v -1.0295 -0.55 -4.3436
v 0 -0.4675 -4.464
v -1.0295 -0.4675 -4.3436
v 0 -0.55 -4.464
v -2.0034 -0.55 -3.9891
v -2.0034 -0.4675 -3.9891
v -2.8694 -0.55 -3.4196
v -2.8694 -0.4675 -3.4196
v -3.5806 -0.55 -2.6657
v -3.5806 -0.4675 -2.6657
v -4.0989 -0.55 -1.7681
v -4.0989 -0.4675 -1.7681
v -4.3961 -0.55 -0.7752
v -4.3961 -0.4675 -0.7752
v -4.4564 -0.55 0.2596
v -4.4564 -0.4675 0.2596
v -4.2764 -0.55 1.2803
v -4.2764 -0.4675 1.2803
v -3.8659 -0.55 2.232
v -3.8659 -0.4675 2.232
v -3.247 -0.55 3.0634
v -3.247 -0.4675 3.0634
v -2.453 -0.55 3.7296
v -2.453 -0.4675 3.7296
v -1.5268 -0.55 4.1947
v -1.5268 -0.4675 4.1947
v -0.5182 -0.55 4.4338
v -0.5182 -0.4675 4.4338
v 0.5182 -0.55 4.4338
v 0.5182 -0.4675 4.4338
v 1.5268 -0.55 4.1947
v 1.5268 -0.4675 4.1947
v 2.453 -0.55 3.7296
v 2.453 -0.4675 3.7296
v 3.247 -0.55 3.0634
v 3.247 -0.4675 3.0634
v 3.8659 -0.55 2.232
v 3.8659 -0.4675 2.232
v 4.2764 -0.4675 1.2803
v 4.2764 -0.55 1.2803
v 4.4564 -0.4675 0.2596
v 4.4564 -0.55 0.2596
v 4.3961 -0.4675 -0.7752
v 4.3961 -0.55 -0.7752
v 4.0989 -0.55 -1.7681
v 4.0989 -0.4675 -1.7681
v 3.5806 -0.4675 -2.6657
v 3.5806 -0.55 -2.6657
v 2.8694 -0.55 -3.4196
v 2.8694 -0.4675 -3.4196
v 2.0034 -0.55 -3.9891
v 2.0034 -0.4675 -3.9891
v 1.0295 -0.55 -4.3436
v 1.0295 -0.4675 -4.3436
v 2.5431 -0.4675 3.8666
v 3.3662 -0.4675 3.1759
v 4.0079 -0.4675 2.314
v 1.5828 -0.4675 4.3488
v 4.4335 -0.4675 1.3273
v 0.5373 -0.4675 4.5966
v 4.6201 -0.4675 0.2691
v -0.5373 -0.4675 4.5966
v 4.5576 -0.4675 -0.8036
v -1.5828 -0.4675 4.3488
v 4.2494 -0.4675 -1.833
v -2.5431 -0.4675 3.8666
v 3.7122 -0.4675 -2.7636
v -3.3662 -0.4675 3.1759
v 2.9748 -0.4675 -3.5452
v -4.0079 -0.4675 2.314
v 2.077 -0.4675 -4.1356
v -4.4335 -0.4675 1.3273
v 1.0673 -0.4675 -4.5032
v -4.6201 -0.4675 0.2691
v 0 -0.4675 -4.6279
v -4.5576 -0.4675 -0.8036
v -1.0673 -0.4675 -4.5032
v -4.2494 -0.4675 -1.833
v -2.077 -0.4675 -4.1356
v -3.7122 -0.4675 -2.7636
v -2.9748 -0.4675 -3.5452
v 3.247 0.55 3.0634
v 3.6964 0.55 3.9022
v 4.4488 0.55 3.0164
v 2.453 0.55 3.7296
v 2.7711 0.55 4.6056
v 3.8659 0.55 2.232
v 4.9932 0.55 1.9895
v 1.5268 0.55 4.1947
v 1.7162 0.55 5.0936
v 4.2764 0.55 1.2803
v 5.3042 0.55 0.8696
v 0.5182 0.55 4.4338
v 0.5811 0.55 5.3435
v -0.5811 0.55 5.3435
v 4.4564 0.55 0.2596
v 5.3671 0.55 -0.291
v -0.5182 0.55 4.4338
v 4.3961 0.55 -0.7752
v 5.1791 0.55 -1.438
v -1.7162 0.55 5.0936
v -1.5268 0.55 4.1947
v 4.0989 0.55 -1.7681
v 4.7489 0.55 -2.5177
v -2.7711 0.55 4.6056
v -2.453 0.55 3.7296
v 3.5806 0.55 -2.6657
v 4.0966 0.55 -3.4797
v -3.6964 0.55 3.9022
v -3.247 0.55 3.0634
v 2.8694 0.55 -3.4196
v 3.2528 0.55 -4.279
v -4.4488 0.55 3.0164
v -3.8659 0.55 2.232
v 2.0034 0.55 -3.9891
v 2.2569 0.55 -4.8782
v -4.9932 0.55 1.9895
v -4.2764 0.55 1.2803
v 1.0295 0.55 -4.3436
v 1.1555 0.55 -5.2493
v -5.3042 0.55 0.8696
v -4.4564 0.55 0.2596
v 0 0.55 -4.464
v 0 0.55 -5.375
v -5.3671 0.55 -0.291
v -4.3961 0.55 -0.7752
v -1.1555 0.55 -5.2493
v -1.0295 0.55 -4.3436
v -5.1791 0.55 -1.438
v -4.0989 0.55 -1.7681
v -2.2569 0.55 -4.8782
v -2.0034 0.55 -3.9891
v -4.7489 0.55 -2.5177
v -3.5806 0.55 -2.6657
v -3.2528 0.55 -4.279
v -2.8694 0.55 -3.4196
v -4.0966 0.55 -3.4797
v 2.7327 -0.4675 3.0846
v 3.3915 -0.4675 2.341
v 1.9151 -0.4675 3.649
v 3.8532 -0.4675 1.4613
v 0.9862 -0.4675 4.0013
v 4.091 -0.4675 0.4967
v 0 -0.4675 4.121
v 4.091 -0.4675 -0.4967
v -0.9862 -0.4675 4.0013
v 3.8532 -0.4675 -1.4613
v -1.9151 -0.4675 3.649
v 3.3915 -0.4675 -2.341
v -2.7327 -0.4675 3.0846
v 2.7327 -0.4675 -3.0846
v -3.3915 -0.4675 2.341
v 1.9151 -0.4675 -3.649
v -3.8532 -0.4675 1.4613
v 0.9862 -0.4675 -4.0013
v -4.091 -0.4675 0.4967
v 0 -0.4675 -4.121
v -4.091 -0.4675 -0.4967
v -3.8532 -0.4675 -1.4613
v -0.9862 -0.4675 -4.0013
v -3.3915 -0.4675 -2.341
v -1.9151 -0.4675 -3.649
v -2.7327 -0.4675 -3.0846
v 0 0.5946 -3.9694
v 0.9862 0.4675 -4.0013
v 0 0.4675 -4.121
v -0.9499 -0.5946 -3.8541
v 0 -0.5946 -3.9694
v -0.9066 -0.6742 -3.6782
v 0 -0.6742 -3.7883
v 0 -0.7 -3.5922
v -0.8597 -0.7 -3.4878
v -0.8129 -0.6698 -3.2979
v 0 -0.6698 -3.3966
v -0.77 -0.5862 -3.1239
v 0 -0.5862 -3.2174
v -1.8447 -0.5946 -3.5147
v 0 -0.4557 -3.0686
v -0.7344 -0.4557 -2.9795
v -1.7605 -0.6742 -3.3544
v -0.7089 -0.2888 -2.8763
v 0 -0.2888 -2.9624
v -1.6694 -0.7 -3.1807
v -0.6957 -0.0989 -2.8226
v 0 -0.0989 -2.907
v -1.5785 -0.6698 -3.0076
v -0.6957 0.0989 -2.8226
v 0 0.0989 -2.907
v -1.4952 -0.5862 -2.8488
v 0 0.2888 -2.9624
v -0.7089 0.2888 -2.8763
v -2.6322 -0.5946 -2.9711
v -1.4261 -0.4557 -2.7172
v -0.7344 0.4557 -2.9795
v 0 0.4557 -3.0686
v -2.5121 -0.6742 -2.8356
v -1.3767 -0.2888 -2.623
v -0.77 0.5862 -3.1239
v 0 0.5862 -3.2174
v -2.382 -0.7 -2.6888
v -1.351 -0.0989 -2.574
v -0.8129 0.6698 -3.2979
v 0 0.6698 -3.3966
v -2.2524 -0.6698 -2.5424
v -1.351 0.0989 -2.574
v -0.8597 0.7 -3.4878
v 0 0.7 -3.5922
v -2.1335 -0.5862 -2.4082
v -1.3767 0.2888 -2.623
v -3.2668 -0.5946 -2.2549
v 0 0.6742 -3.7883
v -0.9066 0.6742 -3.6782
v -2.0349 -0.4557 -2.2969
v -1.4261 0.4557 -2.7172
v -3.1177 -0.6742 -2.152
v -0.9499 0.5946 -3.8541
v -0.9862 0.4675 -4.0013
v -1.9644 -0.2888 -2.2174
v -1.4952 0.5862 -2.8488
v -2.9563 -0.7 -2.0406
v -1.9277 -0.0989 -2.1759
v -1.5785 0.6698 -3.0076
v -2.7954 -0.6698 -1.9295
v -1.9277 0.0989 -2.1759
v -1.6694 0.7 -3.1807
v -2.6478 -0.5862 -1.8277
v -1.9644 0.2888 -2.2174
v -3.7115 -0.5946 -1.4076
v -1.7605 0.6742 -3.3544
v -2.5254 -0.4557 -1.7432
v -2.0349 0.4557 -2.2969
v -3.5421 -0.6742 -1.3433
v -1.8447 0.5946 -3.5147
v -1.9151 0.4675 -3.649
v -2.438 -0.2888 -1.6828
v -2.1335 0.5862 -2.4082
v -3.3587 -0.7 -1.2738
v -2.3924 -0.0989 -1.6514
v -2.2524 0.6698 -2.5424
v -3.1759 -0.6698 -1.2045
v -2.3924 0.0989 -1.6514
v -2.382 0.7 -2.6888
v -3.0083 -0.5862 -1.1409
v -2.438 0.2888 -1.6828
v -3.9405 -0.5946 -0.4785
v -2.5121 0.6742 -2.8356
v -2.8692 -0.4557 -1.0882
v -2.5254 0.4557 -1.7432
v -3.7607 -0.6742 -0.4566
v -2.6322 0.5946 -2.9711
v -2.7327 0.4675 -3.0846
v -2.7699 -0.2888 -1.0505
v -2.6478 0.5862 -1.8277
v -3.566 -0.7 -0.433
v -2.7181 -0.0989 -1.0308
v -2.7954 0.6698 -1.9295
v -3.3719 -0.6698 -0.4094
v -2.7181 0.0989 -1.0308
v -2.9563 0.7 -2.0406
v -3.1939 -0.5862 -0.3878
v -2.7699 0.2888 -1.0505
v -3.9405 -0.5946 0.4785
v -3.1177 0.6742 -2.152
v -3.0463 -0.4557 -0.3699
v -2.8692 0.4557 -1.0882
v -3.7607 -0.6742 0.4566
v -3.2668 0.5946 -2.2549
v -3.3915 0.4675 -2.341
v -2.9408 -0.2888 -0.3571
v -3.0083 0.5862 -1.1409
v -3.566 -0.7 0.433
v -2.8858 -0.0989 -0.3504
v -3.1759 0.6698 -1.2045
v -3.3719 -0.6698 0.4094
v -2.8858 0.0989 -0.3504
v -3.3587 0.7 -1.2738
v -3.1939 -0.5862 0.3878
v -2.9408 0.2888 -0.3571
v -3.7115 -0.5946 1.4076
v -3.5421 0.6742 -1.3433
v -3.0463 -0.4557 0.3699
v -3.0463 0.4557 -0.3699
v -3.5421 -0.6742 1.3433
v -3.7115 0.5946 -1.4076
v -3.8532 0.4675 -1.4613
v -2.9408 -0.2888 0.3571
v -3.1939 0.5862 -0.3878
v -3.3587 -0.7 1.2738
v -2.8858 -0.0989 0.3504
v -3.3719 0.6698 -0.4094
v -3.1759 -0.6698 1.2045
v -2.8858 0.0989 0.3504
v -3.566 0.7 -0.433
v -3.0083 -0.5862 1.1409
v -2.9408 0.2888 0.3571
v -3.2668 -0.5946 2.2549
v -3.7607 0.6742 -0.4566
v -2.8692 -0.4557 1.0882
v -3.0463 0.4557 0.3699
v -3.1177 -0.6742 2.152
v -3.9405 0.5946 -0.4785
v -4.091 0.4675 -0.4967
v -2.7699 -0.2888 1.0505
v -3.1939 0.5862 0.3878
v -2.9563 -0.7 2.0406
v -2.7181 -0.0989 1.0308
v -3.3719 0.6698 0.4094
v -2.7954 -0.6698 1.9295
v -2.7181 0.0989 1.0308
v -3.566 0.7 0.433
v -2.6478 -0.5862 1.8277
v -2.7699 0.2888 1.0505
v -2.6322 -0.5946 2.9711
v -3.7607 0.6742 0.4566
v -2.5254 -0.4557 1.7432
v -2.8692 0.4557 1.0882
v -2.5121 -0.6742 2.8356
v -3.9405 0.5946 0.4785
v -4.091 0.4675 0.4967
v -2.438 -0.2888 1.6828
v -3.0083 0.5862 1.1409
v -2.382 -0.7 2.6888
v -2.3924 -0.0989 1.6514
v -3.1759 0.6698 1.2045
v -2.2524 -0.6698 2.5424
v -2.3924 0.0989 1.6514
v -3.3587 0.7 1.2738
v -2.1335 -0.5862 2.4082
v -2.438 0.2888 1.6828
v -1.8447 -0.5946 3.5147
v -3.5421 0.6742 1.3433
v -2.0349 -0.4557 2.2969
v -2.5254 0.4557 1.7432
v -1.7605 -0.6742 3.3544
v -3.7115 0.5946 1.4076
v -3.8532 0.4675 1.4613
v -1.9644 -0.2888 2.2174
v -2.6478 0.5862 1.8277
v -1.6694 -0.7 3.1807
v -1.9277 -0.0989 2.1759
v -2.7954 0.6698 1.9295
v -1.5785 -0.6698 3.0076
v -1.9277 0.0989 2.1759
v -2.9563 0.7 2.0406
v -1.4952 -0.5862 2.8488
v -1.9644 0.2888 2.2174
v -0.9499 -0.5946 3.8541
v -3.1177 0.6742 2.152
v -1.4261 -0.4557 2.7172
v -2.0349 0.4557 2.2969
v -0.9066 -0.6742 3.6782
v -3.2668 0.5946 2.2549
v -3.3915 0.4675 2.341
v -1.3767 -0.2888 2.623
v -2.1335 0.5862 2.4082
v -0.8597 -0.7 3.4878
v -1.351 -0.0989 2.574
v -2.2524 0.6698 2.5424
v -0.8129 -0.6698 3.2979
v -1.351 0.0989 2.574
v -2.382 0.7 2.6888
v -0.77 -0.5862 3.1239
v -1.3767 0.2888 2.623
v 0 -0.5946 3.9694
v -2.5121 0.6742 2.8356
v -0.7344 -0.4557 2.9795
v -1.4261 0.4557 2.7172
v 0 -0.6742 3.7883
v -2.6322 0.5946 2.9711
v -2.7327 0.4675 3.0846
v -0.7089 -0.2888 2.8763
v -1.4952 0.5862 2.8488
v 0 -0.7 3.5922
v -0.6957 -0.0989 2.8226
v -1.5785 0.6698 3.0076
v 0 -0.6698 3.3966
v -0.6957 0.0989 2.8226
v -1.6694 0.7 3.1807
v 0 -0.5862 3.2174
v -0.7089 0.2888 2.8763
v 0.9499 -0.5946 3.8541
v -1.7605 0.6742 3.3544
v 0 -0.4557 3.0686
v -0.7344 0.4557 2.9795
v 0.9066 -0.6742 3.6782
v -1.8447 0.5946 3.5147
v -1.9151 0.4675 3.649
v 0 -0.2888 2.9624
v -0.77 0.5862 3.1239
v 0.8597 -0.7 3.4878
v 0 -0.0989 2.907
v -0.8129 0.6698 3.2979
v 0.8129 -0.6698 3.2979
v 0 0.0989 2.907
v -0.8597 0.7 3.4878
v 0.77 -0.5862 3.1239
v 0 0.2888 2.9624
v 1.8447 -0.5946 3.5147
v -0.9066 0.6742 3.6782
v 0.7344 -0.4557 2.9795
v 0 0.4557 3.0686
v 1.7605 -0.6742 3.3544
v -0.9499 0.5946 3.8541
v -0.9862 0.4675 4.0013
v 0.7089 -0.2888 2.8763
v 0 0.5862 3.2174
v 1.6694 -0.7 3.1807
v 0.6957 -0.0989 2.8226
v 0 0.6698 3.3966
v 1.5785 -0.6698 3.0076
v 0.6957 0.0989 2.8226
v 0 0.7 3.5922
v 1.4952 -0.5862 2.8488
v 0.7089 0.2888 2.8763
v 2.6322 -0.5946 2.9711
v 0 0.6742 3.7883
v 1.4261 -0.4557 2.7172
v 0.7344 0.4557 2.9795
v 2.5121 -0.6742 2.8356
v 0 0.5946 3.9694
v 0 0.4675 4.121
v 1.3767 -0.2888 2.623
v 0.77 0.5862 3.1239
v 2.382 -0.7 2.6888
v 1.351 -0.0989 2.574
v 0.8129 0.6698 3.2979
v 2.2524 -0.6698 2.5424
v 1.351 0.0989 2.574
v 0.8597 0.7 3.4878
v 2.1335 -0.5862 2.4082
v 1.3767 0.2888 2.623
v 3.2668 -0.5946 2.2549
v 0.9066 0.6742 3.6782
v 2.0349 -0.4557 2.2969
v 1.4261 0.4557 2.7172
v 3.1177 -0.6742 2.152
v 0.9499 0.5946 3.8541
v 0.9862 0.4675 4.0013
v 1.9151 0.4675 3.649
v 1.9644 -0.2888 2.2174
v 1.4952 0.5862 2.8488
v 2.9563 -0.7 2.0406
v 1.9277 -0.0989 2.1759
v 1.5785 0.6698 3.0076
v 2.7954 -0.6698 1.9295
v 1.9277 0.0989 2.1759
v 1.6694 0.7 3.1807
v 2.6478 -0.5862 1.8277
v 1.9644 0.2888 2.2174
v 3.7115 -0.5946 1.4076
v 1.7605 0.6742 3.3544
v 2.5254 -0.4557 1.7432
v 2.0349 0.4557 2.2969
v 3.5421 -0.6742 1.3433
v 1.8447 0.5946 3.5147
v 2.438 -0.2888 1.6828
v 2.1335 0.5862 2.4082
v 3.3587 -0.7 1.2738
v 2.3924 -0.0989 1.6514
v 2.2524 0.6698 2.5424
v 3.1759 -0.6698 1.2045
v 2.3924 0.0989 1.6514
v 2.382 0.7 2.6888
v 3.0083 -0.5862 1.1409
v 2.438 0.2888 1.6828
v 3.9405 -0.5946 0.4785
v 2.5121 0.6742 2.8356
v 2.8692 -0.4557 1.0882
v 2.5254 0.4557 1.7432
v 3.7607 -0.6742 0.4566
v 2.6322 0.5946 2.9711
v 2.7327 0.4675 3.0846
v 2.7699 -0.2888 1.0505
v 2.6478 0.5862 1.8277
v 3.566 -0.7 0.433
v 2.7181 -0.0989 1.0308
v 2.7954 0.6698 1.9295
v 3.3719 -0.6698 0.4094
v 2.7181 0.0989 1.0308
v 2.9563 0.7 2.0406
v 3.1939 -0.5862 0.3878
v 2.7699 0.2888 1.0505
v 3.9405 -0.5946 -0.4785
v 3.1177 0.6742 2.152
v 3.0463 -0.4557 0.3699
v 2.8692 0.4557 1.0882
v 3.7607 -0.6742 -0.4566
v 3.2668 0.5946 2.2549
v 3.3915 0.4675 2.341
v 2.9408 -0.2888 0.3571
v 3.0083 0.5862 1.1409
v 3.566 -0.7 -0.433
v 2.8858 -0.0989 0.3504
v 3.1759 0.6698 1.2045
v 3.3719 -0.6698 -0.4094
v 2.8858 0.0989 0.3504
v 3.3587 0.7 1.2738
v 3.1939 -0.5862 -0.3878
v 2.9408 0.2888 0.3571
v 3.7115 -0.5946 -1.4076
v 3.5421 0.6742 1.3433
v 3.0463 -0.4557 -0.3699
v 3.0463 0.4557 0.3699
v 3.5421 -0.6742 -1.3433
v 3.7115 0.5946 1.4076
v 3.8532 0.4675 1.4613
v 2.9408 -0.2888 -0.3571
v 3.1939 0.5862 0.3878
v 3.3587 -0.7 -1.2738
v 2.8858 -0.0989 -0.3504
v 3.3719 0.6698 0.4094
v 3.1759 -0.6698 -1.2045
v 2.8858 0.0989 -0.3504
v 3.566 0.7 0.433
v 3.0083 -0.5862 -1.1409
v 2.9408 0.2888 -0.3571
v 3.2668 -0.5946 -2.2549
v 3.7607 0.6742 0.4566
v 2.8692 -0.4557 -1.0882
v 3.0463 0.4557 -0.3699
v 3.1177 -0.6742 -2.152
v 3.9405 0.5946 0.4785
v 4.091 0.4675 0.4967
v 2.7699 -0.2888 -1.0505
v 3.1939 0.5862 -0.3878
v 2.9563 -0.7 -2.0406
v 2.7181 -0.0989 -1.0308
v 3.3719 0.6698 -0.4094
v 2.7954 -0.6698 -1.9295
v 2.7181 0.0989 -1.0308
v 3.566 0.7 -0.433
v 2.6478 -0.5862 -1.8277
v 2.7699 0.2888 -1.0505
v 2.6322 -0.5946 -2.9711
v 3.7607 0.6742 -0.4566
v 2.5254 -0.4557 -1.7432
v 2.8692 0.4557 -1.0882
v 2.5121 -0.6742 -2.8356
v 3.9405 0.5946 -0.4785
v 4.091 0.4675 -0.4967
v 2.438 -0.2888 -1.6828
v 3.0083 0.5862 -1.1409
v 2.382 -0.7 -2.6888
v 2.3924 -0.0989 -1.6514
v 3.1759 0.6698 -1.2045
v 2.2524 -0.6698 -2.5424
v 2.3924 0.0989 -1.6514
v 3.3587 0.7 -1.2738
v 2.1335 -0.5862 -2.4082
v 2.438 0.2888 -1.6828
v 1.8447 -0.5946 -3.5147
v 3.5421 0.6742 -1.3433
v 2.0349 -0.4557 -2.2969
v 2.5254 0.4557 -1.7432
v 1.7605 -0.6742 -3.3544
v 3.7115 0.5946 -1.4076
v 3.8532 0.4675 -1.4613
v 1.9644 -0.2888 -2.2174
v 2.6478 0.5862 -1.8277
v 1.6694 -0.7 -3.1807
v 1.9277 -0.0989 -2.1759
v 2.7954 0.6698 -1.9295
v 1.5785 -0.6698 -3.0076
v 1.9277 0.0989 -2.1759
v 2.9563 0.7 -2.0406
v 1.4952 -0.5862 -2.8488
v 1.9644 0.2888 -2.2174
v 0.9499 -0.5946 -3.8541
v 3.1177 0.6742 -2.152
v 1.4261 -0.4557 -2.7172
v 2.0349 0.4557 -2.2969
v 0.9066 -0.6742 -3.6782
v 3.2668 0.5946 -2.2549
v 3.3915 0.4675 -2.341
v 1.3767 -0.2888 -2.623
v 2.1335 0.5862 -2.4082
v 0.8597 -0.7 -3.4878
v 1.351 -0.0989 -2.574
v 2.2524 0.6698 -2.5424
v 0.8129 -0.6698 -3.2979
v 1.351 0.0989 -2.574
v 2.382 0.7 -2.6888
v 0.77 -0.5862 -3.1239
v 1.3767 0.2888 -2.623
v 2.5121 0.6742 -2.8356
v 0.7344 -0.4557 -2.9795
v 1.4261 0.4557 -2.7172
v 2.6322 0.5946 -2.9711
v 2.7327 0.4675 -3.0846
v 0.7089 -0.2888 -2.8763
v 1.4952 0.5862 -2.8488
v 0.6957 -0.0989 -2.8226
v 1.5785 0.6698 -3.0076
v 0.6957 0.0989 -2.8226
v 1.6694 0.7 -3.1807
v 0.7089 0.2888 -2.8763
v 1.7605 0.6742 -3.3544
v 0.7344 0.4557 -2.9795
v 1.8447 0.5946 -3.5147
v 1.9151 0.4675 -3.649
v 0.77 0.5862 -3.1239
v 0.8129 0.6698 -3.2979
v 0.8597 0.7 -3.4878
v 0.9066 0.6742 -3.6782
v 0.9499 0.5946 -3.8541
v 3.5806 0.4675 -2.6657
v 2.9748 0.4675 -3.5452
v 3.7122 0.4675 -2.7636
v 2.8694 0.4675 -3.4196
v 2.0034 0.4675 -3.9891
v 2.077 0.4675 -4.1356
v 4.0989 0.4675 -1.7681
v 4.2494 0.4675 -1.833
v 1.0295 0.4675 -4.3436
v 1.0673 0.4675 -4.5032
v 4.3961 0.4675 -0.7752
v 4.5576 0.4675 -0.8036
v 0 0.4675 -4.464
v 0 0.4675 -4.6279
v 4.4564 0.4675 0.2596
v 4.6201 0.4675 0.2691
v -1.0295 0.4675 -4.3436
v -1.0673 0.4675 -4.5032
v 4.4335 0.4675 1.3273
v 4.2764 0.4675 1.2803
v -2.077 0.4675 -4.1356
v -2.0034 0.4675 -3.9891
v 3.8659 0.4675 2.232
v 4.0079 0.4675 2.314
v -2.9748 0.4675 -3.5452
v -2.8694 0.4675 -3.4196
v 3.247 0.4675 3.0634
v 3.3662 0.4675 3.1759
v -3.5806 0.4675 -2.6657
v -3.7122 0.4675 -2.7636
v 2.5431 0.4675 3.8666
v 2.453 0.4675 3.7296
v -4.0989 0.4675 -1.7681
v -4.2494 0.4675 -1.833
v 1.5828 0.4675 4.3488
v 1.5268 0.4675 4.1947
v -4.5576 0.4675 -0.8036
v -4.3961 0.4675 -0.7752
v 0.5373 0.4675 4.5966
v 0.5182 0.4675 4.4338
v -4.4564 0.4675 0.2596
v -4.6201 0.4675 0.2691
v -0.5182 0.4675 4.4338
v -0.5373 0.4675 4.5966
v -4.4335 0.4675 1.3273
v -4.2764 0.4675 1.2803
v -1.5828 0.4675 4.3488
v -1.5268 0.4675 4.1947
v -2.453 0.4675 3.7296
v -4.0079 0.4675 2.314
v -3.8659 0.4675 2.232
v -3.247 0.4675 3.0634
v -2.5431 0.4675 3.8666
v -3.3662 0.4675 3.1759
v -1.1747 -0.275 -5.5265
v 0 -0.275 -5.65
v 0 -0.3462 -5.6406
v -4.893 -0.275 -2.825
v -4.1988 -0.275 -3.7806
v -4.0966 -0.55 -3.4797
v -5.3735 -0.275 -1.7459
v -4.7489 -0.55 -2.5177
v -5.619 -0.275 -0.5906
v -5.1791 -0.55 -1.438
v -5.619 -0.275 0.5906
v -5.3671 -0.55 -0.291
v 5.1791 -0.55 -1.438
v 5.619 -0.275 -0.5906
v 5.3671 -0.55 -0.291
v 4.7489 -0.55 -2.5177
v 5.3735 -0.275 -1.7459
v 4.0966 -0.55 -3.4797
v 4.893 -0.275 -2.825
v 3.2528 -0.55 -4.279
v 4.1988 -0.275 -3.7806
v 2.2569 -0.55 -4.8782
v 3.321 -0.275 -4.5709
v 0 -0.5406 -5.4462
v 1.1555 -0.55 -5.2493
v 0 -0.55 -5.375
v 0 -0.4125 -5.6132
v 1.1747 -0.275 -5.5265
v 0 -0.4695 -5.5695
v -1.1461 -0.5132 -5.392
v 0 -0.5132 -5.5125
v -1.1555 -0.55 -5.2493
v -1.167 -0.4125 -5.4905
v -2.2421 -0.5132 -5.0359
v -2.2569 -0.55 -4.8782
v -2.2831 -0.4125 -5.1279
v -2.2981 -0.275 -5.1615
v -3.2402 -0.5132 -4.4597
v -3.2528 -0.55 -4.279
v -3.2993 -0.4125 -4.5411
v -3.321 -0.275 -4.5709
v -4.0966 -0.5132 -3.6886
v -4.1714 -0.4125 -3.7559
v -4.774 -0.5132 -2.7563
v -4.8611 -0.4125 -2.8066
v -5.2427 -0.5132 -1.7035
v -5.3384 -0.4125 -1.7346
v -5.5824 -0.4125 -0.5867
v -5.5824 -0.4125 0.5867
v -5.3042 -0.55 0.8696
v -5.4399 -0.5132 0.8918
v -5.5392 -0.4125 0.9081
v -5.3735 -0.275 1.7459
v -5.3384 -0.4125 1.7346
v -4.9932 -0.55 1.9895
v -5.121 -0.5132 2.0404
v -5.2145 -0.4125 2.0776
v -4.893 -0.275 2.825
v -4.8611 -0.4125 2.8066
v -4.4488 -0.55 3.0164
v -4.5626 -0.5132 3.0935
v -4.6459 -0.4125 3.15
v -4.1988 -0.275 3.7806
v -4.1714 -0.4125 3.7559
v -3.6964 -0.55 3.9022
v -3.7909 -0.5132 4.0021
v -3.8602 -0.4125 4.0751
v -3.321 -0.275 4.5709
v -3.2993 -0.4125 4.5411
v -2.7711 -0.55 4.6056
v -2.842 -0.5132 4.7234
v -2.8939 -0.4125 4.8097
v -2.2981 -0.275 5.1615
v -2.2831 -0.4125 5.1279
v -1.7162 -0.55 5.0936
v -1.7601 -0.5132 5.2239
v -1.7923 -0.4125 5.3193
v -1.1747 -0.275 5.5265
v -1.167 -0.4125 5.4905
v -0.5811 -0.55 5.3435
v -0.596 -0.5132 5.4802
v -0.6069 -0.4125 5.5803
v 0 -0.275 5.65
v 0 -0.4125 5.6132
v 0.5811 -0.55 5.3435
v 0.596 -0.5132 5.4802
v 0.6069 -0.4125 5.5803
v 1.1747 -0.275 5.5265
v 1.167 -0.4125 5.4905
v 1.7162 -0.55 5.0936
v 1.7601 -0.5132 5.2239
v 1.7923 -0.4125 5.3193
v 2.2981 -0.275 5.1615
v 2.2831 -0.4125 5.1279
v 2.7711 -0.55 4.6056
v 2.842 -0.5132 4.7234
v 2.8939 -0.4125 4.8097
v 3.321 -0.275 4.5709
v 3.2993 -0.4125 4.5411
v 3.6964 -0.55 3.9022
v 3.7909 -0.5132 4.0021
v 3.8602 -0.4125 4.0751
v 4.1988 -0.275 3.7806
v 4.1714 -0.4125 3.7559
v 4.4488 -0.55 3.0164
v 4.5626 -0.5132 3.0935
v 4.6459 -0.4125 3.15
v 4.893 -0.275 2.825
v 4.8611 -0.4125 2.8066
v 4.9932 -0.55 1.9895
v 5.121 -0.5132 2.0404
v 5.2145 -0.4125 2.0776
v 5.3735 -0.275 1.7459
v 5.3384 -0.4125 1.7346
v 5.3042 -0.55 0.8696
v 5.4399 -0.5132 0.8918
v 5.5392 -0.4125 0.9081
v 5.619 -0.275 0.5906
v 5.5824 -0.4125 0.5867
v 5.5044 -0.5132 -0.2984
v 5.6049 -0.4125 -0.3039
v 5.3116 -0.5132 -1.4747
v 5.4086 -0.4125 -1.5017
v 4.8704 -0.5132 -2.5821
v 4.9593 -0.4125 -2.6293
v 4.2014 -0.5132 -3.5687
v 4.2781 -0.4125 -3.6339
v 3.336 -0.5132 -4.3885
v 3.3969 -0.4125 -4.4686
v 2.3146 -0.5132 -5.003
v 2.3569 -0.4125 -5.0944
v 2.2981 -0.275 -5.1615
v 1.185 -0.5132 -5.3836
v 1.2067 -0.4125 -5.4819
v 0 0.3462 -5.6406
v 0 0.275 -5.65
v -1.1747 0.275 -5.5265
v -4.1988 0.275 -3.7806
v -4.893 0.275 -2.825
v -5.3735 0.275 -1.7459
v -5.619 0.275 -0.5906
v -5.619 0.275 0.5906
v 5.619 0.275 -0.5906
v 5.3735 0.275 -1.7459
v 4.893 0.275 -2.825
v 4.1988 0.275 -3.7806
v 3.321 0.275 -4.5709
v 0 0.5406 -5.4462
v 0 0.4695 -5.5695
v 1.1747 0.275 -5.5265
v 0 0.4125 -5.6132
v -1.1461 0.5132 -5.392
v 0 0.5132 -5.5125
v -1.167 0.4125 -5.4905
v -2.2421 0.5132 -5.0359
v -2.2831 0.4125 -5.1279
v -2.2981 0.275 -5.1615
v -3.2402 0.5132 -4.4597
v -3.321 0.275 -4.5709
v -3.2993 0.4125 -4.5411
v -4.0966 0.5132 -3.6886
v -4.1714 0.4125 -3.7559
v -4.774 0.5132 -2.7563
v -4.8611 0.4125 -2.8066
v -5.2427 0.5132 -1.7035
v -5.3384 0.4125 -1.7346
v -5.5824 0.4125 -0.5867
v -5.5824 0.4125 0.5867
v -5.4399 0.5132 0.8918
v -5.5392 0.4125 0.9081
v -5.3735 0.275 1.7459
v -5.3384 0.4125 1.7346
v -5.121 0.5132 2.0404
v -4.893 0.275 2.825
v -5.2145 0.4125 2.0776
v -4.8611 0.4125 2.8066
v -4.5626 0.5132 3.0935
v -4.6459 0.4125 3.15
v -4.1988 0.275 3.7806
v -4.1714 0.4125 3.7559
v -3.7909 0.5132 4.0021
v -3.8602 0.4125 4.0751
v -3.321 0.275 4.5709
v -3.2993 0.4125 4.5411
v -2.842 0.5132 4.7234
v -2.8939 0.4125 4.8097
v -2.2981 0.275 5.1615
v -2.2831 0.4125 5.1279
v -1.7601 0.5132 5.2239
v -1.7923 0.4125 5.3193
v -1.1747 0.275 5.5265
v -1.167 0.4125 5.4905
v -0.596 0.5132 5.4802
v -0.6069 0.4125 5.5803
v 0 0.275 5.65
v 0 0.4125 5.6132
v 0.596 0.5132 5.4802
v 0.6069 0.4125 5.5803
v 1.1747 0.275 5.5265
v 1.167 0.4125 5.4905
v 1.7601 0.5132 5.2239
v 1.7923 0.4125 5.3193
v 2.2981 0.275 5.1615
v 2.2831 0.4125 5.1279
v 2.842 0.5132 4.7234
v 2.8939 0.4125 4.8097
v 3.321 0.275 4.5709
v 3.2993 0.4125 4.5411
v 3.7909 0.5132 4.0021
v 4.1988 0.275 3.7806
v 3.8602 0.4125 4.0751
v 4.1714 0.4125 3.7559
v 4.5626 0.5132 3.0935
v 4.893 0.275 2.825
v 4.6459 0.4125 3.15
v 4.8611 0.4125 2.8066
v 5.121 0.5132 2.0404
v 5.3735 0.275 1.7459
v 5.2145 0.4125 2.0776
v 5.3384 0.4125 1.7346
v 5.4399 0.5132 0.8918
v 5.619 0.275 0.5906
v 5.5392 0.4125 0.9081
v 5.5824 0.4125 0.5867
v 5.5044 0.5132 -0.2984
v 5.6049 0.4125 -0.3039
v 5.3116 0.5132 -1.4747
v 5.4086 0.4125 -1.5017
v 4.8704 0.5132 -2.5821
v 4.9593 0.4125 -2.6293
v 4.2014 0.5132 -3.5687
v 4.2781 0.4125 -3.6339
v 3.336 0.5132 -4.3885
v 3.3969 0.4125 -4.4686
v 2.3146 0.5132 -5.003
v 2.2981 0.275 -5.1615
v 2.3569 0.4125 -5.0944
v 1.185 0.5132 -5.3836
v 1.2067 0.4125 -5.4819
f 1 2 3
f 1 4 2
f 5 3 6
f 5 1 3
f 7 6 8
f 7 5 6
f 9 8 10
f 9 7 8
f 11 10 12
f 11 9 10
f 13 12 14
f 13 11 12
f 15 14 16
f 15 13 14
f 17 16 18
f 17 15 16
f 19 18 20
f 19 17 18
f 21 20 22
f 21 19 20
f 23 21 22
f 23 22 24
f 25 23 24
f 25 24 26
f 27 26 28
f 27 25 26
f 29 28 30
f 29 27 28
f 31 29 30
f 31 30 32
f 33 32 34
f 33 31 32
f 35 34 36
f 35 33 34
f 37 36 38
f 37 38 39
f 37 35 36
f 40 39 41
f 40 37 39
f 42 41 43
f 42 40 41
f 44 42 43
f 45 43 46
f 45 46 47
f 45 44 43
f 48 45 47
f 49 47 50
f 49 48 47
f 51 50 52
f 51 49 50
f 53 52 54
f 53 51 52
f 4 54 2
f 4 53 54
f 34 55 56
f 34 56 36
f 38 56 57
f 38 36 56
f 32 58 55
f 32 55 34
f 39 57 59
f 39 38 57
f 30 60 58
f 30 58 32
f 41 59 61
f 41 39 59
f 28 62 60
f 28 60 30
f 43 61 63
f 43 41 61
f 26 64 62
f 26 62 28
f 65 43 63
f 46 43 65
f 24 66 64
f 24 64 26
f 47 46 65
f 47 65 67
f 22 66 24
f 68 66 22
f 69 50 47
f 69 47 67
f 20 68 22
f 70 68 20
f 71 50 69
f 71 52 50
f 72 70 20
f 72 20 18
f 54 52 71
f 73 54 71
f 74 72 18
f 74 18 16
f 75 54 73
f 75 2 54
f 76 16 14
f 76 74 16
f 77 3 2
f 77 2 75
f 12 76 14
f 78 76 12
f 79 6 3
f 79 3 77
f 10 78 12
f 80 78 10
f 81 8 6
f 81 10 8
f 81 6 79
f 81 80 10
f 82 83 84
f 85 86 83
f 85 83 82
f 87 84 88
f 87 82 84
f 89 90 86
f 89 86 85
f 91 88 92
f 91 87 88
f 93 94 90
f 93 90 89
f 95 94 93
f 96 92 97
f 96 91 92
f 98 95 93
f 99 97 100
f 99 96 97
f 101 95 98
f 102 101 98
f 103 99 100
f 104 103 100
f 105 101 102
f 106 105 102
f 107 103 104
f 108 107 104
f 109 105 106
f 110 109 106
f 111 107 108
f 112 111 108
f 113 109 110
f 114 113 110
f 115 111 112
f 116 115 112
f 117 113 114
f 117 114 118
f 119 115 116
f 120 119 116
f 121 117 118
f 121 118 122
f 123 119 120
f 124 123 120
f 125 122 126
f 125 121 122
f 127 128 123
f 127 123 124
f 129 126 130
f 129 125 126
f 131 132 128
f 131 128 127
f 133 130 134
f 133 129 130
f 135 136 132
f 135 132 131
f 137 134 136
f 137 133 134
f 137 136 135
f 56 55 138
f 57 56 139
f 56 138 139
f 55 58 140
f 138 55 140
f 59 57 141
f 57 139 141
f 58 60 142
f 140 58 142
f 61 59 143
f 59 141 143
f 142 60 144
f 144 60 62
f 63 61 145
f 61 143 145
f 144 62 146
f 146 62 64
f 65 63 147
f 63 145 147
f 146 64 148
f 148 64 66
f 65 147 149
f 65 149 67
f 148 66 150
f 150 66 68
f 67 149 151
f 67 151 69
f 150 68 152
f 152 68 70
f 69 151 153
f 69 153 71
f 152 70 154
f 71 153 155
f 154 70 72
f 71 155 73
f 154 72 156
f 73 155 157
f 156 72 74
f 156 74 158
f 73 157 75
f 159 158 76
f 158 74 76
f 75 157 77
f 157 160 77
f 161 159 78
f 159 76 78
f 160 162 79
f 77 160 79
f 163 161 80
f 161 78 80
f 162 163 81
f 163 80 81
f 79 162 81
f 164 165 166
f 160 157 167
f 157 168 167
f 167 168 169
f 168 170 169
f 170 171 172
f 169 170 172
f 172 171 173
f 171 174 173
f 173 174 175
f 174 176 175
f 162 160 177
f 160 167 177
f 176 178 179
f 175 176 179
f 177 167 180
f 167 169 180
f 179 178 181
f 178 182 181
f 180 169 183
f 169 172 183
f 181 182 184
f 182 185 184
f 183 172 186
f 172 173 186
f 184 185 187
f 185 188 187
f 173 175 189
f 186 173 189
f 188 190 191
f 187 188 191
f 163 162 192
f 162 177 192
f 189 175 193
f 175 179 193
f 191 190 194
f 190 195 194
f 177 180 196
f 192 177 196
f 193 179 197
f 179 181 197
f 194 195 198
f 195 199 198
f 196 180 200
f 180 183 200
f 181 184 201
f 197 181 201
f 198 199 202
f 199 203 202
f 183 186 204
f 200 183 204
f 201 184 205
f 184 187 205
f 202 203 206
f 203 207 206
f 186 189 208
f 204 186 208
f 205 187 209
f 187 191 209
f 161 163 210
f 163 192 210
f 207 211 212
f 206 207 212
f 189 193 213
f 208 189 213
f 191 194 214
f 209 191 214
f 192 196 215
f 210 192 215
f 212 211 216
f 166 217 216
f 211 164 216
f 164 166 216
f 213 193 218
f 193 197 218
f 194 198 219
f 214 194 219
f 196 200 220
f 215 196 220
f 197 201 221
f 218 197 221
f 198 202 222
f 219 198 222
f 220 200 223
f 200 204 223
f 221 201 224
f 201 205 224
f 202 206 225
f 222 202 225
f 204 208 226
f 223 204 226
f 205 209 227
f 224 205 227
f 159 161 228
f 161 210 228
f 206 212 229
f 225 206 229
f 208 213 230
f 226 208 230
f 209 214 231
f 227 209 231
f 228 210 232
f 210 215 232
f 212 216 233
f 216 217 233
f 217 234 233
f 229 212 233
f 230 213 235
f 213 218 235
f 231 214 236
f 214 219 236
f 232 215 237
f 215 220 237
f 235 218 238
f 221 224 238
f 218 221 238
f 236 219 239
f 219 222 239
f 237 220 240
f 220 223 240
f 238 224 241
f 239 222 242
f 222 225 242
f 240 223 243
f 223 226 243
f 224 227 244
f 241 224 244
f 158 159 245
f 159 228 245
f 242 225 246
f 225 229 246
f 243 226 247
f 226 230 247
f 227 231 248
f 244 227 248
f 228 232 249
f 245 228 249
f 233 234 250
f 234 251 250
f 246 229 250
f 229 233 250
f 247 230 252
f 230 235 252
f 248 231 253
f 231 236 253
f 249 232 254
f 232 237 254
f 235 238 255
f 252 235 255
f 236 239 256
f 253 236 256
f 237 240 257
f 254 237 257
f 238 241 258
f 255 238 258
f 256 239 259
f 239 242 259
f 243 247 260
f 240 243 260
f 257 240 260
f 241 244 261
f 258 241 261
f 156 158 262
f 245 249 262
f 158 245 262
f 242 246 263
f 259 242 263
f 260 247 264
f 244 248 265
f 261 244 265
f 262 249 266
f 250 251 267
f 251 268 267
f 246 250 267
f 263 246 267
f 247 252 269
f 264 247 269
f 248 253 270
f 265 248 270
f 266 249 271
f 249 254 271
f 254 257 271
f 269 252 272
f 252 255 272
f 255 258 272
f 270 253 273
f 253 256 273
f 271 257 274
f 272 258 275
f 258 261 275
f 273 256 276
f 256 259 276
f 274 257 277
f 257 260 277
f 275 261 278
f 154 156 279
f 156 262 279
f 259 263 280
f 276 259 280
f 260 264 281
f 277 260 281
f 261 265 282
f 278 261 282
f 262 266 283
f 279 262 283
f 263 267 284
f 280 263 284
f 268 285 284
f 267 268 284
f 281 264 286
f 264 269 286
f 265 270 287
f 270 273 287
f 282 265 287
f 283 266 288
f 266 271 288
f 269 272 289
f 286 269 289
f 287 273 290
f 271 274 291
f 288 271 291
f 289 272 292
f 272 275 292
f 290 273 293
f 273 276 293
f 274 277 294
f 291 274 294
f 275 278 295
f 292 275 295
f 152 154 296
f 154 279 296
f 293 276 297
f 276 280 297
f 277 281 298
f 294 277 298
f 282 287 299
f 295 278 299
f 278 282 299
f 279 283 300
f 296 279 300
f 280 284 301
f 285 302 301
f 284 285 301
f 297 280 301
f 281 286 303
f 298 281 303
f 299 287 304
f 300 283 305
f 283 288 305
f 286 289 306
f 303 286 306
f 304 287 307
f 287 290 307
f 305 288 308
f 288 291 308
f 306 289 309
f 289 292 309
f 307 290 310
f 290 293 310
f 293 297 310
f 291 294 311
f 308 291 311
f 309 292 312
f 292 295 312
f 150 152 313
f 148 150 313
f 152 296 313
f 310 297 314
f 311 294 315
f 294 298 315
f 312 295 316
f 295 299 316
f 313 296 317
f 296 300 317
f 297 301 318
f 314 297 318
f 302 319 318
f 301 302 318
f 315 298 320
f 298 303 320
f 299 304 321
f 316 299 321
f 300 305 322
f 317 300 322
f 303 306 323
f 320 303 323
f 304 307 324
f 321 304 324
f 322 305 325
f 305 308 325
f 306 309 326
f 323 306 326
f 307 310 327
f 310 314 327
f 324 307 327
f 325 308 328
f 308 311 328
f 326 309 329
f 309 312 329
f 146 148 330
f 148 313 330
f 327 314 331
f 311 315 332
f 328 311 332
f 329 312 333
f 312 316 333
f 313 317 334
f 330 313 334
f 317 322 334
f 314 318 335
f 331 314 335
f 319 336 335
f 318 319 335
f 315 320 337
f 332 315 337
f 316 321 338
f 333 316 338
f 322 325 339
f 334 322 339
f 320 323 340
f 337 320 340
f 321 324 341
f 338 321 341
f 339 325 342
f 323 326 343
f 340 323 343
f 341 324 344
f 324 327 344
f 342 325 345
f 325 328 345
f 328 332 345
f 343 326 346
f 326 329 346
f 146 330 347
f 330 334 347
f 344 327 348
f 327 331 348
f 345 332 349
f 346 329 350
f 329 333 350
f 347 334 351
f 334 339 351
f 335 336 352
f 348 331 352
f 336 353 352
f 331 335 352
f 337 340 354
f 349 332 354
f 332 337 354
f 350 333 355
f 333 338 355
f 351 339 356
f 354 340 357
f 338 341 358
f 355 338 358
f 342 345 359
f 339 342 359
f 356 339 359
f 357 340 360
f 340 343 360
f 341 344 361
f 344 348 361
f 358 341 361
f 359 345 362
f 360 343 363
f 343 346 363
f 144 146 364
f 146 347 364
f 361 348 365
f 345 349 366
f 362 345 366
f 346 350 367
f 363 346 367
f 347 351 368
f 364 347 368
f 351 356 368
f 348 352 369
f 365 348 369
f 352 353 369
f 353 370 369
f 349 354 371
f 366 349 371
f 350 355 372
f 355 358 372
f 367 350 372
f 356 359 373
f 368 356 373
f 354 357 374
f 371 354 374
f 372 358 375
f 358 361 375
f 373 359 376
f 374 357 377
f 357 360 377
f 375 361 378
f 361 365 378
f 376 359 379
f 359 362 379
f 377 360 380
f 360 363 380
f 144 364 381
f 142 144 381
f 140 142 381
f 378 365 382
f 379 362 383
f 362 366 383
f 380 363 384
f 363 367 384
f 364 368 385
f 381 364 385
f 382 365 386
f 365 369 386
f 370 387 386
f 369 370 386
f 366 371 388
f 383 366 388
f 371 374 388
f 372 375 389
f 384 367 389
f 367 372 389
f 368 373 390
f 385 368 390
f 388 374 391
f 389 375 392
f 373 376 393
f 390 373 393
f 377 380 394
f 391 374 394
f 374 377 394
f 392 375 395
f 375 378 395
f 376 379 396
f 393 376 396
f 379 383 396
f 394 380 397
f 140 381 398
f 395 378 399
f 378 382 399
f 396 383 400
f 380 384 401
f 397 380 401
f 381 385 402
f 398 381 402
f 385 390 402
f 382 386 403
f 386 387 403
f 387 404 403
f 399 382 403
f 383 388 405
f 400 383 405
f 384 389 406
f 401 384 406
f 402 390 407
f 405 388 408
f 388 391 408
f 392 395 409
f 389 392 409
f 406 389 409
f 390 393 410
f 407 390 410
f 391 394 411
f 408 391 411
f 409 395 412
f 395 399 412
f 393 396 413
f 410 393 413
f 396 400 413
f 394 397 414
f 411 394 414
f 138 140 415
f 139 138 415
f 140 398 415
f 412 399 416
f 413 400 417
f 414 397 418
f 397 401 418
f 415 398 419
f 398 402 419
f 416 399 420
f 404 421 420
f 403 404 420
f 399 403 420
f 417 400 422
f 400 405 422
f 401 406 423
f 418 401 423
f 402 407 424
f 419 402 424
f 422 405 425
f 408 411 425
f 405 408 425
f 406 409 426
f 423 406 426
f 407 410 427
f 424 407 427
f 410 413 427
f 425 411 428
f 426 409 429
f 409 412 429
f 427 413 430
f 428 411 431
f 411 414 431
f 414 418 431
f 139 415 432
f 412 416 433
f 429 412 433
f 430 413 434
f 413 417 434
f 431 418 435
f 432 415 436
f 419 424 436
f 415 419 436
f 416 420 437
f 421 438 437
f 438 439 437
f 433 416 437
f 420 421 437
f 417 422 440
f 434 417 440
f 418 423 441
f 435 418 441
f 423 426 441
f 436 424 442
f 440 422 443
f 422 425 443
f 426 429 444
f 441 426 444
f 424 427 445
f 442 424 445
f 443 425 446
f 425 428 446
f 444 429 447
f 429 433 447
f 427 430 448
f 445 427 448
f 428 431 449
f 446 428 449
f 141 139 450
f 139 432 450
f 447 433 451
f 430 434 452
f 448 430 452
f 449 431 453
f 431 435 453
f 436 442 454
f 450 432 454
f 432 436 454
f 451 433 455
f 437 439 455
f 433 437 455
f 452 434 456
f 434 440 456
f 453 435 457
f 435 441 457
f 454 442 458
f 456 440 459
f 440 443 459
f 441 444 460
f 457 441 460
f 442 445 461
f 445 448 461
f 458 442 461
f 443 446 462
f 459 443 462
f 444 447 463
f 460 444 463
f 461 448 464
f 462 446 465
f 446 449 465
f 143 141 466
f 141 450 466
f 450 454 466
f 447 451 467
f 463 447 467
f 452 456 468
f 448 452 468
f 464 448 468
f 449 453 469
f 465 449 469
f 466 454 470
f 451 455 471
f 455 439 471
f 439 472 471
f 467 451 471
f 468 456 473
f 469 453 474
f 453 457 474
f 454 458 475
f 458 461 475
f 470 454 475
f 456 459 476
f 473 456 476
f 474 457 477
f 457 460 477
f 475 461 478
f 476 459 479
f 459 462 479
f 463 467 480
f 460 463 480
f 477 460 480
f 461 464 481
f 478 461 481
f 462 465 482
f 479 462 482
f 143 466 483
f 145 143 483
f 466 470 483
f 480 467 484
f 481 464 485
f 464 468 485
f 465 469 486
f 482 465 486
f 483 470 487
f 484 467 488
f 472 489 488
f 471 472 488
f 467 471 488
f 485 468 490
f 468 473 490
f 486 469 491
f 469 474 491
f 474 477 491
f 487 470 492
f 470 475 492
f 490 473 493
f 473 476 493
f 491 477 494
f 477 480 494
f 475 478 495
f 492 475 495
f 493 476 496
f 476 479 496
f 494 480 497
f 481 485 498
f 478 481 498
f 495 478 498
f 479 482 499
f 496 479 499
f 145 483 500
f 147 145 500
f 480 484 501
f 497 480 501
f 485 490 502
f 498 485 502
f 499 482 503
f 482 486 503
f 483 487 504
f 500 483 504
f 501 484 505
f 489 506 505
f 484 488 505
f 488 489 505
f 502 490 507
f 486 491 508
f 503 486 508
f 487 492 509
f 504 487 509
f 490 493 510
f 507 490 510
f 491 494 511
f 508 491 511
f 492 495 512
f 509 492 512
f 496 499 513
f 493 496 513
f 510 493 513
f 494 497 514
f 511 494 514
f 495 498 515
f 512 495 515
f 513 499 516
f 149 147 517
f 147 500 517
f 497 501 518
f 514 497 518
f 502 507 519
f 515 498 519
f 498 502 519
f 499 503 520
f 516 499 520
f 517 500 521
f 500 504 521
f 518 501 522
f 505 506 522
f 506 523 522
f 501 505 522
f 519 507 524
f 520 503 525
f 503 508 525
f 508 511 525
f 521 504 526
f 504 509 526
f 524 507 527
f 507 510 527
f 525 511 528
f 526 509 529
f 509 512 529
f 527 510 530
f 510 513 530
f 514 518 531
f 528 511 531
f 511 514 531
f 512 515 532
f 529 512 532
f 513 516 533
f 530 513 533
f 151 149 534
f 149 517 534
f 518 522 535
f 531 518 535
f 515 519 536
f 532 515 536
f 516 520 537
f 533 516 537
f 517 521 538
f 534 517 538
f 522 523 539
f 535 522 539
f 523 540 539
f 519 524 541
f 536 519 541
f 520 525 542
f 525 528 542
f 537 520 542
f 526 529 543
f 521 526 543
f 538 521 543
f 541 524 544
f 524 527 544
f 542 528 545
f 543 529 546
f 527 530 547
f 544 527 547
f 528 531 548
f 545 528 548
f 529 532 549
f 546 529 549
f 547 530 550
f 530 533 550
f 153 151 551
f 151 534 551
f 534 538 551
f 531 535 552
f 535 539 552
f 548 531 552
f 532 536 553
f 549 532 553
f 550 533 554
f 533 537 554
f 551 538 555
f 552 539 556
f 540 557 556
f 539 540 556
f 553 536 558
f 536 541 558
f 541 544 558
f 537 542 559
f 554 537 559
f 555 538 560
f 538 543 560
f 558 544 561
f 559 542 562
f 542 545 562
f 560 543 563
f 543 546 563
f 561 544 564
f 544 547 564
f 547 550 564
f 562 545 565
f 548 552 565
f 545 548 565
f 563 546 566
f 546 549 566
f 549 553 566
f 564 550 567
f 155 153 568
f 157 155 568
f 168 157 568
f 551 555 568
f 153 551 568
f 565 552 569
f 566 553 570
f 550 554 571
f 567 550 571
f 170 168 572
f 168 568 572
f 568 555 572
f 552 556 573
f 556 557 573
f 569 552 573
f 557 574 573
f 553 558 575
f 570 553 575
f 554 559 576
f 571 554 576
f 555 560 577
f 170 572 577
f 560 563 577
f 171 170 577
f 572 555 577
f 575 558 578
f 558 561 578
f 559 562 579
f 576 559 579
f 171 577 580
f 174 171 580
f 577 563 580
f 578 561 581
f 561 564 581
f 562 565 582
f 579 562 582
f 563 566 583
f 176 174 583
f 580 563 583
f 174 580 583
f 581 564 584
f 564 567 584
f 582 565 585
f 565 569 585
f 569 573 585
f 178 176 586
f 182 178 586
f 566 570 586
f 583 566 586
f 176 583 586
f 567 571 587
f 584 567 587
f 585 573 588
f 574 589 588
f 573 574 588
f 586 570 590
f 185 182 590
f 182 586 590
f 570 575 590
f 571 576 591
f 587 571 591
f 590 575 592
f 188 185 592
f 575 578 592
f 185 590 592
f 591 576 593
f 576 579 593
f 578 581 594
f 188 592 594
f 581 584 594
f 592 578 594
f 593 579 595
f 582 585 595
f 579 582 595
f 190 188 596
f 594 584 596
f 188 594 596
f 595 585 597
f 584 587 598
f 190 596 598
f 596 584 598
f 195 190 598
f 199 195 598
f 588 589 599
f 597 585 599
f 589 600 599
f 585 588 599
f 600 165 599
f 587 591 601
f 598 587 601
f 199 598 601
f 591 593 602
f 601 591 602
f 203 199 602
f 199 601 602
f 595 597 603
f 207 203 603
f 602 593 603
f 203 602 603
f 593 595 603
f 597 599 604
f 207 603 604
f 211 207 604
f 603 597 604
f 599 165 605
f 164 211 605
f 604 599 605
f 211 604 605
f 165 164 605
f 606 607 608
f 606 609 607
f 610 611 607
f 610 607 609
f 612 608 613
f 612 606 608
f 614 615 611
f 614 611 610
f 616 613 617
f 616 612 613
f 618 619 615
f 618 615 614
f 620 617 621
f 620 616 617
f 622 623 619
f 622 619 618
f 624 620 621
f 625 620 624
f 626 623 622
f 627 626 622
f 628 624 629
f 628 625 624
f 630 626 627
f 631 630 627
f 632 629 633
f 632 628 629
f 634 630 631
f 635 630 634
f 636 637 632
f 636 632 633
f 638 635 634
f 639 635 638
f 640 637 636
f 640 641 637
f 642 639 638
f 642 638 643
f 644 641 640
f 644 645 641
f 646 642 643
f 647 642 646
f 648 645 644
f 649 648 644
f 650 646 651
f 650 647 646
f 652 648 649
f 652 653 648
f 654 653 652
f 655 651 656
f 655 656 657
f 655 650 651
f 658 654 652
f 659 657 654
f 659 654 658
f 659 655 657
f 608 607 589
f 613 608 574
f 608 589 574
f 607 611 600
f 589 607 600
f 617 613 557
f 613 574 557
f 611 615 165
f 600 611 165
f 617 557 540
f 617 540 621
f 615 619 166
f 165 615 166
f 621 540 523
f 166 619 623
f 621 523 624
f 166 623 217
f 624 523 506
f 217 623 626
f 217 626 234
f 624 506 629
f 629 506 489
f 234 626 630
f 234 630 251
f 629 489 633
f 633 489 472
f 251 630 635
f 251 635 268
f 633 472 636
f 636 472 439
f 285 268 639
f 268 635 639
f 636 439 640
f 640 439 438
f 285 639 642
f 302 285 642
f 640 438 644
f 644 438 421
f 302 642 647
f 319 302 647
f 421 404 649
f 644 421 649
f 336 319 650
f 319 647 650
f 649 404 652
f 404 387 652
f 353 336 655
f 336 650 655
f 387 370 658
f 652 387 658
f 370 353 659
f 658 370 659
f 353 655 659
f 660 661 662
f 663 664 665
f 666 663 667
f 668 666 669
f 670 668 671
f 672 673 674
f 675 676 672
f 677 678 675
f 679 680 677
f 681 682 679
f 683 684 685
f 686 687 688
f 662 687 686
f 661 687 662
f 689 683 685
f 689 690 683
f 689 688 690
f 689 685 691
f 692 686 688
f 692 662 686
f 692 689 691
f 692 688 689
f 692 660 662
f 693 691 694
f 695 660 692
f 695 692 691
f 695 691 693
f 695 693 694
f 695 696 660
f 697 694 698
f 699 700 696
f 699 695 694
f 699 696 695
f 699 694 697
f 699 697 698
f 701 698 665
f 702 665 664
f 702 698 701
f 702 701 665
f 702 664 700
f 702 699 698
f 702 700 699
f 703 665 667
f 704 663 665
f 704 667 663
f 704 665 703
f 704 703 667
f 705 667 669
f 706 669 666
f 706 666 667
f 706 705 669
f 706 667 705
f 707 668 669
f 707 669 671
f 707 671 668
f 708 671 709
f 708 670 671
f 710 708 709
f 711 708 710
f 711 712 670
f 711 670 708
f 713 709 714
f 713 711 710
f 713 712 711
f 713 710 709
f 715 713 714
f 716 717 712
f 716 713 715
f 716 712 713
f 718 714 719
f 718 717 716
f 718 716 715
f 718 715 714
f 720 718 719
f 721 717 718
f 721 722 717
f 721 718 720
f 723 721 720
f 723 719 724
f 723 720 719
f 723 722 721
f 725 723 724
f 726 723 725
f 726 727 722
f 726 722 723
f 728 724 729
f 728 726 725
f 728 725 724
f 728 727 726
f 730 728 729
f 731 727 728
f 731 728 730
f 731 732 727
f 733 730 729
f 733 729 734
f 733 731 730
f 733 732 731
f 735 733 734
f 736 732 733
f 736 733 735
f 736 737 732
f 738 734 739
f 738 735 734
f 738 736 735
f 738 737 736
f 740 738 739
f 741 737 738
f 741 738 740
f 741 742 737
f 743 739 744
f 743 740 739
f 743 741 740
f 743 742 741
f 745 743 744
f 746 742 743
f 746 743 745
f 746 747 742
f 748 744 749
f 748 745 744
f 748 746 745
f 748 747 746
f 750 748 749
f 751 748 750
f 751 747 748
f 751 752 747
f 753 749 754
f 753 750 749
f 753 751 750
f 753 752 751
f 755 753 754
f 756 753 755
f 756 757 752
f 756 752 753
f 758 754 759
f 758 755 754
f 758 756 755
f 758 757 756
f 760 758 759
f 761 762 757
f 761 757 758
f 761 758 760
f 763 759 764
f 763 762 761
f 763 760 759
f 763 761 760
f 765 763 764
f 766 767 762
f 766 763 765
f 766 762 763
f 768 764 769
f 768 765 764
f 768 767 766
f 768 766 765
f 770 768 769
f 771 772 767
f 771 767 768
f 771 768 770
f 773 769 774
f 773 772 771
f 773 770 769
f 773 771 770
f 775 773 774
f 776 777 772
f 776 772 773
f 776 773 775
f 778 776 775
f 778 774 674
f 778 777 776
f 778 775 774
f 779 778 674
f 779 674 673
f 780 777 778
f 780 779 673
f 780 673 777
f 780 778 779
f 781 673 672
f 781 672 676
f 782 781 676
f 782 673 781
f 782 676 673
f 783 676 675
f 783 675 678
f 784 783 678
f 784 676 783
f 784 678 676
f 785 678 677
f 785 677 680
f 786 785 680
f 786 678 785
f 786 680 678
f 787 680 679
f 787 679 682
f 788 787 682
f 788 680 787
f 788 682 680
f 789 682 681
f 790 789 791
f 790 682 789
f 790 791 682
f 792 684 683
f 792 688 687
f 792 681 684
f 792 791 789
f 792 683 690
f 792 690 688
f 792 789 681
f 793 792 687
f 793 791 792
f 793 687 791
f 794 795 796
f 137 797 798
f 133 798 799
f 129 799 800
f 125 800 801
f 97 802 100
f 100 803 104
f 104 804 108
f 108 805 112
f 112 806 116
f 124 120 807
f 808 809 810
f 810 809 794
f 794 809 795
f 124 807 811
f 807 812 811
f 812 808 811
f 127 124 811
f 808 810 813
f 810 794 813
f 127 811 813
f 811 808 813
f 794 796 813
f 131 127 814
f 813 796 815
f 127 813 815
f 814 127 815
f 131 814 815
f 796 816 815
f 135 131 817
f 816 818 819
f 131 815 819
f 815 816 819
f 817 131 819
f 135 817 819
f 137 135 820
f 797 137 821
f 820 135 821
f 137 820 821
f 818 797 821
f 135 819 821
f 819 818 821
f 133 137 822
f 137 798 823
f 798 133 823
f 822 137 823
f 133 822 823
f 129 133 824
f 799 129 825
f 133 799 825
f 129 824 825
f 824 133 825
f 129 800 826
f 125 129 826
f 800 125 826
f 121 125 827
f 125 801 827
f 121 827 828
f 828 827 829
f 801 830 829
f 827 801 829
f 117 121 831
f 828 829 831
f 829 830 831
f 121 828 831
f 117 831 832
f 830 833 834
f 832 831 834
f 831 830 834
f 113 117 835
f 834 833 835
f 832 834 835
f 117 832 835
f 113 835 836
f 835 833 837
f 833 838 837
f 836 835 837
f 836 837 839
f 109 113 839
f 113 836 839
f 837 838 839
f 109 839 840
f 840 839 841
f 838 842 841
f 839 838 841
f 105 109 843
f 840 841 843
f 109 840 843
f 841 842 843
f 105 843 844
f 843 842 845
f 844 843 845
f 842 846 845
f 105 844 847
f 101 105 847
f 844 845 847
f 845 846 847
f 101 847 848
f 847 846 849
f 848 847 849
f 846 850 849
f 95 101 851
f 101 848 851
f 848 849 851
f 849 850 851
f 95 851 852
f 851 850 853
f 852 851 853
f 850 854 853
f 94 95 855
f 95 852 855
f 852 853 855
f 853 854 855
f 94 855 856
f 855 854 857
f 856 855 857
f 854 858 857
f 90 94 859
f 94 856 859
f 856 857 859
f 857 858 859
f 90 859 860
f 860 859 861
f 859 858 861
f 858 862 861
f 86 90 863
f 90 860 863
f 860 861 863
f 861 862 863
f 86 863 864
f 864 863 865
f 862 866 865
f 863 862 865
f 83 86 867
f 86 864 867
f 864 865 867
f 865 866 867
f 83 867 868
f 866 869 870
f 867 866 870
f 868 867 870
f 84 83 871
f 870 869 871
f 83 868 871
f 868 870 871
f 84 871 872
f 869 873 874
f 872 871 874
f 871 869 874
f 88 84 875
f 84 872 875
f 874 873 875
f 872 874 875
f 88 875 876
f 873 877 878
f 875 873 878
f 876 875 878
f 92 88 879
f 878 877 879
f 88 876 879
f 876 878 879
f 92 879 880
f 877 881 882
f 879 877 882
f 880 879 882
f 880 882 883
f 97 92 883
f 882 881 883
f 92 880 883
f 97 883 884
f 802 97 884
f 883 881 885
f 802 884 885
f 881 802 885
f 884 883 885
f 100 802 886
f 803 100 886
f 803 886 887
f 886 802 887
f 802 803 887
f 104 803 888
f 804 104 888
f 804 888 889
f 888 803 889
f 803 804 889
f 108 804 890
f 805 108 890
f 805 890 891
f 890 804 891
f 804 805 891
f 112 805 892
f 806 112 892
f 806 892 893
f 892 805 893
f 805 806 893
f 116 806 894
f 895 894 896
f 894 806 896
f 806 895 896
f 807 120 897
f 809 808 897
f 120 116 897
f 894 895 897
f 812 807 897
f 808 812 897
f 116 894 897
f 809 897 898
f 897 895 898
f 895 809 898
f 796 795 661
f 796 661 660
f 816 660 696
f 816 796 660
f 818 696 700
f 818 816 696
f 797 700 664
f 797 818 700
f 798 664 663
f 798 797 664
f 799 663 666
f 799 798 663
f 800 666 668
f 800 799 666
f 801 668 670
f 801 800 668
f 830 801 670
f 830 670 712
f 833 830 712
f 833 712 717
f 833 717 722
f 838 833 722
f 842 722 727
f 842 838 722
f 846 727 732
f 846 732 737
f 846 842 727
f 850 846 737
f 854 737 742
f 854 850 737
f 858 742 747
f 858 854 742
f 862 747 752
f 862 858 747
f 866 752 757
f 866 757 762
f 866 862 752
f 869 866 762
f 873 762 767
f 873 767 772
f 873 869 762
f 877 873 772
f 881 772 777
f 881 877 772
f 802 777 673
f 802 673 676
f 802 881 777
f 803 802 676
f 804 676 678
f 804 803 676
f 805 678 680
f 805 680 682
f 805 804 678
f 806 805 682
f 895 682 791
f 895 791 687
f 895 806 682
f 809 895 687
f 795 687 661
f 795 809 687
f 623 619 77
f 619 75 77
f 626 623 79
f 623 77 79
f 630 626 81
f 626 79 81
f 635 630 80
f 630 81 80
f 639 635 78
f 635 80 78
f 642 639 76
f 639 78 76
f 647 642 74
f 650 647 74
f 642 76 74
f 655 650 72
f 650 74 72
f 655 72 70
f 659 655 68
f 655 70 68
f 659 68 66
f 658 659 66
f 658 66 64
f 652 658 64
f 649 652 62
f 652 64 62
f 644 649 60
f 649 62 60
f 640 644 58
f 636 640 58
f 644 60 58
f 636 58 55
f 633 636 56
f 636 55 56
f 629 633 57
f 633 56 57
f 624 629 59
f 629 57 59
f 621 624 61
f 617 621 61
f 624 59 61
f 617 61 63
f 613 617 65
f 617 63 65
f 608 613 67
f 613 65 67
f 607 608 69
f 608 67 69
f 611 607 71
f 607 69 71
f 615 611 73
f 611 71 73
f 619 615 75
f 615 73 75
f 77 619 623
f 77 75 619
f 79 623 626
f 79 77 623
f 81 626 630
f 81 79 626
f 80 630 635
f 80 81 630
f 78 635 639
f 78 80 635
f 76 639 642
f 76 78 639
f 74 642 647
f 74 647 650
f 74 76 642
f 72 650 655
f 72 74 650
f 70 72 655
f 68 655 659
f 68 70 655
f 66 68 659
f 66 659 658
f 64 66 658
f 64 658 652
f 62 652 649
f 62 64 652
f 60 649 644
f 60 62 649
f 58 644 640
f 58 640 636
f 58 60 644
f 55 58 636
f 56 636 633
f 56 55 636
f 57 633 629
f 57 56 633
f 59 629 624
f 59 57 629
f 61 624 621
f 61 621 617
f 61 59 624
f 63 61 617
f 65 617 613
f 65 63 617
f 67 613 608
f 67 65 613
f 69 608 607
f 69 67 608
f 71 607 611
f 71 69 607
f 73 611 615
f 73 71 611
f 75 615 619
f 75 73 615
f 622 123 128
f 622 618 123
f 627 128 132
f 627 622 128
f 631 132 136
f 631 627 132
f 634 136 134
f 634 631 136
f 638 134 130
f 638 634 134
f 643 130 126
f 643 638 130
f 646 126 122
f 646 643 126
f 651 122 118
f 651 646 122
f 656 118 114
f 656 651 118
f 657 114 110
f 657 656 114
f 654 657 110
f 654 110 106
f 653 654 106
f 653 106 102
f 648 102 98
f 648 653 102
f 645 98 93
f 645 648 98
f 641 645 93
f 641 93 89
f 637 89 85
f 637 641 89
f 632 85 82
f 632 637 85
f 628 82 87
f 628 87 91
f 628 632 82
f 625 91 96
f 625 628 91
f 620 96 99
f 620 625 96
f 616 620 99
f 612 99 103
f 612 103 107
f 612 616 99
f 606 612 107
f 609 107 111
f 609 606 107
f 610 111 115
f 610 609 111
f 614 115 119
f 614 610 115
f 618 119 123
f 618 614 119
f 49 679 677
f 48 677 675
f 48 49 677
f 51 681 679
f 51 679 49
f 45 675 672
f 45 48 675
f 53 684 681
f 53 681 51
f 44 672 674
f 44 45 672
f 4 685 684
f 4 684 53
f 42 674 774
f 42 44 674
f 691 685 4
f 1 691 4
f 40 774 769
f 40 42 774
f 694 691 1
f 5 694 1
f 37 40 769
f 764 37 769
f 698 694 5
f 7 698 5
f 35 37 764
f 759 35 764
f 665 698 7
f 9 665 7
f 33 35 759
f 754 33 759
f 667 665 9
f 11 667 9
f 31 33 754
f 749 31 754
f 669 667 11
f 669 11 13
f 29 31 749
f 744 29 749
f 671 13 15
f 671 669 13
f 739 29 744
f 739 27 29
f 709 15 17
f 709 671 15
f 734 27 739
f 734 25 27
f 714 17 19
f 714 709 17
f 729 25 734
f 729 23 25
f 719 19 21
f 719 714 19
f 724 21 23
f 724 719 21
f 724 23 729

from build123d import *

# Parameters (mm, degrees)
FILLET1_R = 0.275


with BuildPart() as part:
    # Sketch2 → Revolve1 (revolve)
    with BuildSketch(Plane.XY, mode=Mode.PRIVATE) as revolve1_sk:
        Polygon((-5.65, 0.55), (-4.463953488, 0.55), (-4.463953488, 0.4675), (-4.627906977, 0.4675), (-4.627906977, -0.4675), (-4.463953488, -0.4675), (-4.463953488, -0.55), (-5.65, -0.55), align=None)
    revolve(revolve1_sk.sketch.rotate(Axis((0, 0, 0), (0, 1, 0)), 270), axis=Axis((0, 0, 0), (0, 1, 0)))

    # Fillet1
    fillet1_edges = [part.edges().sort_by_distance(p)[0] for p in [
        (0, 0.55, 5.65),
        (0, -0.55, 5.65),
    ]]
    fillet(fillet1_edges, radius=FILLET1_R)


with BuildPart() as body_2:
    # Sketch4 → Revolve2 (revolve)
    with BuildSketch(Plane.XY, mode=Mode.PRIVATE) as revolve2_sk:
        with BuildLine():
            Line((-4.627906977, 0.4675), (-4.627906977, -0.4675))
            Line((-4.627906977, -0.4675), (-4.121002639, -0.4675))
            ThreePointArc((-4.121002639, -0.4675), (-2.9, 0), (-4.121002639, 0.4675))
            Line((-4.121002639, 0.4675), (-4.627906977, 0.4675))
        make_face()
    revolve(revolve2_sk.sketch.rotate(Axis((0, 0, 0), (0, 1, 0)), 270), axis=Axis((0, 0, 0), (0, 1, 0)))


solid = Compound([part.part, body_2.part])
